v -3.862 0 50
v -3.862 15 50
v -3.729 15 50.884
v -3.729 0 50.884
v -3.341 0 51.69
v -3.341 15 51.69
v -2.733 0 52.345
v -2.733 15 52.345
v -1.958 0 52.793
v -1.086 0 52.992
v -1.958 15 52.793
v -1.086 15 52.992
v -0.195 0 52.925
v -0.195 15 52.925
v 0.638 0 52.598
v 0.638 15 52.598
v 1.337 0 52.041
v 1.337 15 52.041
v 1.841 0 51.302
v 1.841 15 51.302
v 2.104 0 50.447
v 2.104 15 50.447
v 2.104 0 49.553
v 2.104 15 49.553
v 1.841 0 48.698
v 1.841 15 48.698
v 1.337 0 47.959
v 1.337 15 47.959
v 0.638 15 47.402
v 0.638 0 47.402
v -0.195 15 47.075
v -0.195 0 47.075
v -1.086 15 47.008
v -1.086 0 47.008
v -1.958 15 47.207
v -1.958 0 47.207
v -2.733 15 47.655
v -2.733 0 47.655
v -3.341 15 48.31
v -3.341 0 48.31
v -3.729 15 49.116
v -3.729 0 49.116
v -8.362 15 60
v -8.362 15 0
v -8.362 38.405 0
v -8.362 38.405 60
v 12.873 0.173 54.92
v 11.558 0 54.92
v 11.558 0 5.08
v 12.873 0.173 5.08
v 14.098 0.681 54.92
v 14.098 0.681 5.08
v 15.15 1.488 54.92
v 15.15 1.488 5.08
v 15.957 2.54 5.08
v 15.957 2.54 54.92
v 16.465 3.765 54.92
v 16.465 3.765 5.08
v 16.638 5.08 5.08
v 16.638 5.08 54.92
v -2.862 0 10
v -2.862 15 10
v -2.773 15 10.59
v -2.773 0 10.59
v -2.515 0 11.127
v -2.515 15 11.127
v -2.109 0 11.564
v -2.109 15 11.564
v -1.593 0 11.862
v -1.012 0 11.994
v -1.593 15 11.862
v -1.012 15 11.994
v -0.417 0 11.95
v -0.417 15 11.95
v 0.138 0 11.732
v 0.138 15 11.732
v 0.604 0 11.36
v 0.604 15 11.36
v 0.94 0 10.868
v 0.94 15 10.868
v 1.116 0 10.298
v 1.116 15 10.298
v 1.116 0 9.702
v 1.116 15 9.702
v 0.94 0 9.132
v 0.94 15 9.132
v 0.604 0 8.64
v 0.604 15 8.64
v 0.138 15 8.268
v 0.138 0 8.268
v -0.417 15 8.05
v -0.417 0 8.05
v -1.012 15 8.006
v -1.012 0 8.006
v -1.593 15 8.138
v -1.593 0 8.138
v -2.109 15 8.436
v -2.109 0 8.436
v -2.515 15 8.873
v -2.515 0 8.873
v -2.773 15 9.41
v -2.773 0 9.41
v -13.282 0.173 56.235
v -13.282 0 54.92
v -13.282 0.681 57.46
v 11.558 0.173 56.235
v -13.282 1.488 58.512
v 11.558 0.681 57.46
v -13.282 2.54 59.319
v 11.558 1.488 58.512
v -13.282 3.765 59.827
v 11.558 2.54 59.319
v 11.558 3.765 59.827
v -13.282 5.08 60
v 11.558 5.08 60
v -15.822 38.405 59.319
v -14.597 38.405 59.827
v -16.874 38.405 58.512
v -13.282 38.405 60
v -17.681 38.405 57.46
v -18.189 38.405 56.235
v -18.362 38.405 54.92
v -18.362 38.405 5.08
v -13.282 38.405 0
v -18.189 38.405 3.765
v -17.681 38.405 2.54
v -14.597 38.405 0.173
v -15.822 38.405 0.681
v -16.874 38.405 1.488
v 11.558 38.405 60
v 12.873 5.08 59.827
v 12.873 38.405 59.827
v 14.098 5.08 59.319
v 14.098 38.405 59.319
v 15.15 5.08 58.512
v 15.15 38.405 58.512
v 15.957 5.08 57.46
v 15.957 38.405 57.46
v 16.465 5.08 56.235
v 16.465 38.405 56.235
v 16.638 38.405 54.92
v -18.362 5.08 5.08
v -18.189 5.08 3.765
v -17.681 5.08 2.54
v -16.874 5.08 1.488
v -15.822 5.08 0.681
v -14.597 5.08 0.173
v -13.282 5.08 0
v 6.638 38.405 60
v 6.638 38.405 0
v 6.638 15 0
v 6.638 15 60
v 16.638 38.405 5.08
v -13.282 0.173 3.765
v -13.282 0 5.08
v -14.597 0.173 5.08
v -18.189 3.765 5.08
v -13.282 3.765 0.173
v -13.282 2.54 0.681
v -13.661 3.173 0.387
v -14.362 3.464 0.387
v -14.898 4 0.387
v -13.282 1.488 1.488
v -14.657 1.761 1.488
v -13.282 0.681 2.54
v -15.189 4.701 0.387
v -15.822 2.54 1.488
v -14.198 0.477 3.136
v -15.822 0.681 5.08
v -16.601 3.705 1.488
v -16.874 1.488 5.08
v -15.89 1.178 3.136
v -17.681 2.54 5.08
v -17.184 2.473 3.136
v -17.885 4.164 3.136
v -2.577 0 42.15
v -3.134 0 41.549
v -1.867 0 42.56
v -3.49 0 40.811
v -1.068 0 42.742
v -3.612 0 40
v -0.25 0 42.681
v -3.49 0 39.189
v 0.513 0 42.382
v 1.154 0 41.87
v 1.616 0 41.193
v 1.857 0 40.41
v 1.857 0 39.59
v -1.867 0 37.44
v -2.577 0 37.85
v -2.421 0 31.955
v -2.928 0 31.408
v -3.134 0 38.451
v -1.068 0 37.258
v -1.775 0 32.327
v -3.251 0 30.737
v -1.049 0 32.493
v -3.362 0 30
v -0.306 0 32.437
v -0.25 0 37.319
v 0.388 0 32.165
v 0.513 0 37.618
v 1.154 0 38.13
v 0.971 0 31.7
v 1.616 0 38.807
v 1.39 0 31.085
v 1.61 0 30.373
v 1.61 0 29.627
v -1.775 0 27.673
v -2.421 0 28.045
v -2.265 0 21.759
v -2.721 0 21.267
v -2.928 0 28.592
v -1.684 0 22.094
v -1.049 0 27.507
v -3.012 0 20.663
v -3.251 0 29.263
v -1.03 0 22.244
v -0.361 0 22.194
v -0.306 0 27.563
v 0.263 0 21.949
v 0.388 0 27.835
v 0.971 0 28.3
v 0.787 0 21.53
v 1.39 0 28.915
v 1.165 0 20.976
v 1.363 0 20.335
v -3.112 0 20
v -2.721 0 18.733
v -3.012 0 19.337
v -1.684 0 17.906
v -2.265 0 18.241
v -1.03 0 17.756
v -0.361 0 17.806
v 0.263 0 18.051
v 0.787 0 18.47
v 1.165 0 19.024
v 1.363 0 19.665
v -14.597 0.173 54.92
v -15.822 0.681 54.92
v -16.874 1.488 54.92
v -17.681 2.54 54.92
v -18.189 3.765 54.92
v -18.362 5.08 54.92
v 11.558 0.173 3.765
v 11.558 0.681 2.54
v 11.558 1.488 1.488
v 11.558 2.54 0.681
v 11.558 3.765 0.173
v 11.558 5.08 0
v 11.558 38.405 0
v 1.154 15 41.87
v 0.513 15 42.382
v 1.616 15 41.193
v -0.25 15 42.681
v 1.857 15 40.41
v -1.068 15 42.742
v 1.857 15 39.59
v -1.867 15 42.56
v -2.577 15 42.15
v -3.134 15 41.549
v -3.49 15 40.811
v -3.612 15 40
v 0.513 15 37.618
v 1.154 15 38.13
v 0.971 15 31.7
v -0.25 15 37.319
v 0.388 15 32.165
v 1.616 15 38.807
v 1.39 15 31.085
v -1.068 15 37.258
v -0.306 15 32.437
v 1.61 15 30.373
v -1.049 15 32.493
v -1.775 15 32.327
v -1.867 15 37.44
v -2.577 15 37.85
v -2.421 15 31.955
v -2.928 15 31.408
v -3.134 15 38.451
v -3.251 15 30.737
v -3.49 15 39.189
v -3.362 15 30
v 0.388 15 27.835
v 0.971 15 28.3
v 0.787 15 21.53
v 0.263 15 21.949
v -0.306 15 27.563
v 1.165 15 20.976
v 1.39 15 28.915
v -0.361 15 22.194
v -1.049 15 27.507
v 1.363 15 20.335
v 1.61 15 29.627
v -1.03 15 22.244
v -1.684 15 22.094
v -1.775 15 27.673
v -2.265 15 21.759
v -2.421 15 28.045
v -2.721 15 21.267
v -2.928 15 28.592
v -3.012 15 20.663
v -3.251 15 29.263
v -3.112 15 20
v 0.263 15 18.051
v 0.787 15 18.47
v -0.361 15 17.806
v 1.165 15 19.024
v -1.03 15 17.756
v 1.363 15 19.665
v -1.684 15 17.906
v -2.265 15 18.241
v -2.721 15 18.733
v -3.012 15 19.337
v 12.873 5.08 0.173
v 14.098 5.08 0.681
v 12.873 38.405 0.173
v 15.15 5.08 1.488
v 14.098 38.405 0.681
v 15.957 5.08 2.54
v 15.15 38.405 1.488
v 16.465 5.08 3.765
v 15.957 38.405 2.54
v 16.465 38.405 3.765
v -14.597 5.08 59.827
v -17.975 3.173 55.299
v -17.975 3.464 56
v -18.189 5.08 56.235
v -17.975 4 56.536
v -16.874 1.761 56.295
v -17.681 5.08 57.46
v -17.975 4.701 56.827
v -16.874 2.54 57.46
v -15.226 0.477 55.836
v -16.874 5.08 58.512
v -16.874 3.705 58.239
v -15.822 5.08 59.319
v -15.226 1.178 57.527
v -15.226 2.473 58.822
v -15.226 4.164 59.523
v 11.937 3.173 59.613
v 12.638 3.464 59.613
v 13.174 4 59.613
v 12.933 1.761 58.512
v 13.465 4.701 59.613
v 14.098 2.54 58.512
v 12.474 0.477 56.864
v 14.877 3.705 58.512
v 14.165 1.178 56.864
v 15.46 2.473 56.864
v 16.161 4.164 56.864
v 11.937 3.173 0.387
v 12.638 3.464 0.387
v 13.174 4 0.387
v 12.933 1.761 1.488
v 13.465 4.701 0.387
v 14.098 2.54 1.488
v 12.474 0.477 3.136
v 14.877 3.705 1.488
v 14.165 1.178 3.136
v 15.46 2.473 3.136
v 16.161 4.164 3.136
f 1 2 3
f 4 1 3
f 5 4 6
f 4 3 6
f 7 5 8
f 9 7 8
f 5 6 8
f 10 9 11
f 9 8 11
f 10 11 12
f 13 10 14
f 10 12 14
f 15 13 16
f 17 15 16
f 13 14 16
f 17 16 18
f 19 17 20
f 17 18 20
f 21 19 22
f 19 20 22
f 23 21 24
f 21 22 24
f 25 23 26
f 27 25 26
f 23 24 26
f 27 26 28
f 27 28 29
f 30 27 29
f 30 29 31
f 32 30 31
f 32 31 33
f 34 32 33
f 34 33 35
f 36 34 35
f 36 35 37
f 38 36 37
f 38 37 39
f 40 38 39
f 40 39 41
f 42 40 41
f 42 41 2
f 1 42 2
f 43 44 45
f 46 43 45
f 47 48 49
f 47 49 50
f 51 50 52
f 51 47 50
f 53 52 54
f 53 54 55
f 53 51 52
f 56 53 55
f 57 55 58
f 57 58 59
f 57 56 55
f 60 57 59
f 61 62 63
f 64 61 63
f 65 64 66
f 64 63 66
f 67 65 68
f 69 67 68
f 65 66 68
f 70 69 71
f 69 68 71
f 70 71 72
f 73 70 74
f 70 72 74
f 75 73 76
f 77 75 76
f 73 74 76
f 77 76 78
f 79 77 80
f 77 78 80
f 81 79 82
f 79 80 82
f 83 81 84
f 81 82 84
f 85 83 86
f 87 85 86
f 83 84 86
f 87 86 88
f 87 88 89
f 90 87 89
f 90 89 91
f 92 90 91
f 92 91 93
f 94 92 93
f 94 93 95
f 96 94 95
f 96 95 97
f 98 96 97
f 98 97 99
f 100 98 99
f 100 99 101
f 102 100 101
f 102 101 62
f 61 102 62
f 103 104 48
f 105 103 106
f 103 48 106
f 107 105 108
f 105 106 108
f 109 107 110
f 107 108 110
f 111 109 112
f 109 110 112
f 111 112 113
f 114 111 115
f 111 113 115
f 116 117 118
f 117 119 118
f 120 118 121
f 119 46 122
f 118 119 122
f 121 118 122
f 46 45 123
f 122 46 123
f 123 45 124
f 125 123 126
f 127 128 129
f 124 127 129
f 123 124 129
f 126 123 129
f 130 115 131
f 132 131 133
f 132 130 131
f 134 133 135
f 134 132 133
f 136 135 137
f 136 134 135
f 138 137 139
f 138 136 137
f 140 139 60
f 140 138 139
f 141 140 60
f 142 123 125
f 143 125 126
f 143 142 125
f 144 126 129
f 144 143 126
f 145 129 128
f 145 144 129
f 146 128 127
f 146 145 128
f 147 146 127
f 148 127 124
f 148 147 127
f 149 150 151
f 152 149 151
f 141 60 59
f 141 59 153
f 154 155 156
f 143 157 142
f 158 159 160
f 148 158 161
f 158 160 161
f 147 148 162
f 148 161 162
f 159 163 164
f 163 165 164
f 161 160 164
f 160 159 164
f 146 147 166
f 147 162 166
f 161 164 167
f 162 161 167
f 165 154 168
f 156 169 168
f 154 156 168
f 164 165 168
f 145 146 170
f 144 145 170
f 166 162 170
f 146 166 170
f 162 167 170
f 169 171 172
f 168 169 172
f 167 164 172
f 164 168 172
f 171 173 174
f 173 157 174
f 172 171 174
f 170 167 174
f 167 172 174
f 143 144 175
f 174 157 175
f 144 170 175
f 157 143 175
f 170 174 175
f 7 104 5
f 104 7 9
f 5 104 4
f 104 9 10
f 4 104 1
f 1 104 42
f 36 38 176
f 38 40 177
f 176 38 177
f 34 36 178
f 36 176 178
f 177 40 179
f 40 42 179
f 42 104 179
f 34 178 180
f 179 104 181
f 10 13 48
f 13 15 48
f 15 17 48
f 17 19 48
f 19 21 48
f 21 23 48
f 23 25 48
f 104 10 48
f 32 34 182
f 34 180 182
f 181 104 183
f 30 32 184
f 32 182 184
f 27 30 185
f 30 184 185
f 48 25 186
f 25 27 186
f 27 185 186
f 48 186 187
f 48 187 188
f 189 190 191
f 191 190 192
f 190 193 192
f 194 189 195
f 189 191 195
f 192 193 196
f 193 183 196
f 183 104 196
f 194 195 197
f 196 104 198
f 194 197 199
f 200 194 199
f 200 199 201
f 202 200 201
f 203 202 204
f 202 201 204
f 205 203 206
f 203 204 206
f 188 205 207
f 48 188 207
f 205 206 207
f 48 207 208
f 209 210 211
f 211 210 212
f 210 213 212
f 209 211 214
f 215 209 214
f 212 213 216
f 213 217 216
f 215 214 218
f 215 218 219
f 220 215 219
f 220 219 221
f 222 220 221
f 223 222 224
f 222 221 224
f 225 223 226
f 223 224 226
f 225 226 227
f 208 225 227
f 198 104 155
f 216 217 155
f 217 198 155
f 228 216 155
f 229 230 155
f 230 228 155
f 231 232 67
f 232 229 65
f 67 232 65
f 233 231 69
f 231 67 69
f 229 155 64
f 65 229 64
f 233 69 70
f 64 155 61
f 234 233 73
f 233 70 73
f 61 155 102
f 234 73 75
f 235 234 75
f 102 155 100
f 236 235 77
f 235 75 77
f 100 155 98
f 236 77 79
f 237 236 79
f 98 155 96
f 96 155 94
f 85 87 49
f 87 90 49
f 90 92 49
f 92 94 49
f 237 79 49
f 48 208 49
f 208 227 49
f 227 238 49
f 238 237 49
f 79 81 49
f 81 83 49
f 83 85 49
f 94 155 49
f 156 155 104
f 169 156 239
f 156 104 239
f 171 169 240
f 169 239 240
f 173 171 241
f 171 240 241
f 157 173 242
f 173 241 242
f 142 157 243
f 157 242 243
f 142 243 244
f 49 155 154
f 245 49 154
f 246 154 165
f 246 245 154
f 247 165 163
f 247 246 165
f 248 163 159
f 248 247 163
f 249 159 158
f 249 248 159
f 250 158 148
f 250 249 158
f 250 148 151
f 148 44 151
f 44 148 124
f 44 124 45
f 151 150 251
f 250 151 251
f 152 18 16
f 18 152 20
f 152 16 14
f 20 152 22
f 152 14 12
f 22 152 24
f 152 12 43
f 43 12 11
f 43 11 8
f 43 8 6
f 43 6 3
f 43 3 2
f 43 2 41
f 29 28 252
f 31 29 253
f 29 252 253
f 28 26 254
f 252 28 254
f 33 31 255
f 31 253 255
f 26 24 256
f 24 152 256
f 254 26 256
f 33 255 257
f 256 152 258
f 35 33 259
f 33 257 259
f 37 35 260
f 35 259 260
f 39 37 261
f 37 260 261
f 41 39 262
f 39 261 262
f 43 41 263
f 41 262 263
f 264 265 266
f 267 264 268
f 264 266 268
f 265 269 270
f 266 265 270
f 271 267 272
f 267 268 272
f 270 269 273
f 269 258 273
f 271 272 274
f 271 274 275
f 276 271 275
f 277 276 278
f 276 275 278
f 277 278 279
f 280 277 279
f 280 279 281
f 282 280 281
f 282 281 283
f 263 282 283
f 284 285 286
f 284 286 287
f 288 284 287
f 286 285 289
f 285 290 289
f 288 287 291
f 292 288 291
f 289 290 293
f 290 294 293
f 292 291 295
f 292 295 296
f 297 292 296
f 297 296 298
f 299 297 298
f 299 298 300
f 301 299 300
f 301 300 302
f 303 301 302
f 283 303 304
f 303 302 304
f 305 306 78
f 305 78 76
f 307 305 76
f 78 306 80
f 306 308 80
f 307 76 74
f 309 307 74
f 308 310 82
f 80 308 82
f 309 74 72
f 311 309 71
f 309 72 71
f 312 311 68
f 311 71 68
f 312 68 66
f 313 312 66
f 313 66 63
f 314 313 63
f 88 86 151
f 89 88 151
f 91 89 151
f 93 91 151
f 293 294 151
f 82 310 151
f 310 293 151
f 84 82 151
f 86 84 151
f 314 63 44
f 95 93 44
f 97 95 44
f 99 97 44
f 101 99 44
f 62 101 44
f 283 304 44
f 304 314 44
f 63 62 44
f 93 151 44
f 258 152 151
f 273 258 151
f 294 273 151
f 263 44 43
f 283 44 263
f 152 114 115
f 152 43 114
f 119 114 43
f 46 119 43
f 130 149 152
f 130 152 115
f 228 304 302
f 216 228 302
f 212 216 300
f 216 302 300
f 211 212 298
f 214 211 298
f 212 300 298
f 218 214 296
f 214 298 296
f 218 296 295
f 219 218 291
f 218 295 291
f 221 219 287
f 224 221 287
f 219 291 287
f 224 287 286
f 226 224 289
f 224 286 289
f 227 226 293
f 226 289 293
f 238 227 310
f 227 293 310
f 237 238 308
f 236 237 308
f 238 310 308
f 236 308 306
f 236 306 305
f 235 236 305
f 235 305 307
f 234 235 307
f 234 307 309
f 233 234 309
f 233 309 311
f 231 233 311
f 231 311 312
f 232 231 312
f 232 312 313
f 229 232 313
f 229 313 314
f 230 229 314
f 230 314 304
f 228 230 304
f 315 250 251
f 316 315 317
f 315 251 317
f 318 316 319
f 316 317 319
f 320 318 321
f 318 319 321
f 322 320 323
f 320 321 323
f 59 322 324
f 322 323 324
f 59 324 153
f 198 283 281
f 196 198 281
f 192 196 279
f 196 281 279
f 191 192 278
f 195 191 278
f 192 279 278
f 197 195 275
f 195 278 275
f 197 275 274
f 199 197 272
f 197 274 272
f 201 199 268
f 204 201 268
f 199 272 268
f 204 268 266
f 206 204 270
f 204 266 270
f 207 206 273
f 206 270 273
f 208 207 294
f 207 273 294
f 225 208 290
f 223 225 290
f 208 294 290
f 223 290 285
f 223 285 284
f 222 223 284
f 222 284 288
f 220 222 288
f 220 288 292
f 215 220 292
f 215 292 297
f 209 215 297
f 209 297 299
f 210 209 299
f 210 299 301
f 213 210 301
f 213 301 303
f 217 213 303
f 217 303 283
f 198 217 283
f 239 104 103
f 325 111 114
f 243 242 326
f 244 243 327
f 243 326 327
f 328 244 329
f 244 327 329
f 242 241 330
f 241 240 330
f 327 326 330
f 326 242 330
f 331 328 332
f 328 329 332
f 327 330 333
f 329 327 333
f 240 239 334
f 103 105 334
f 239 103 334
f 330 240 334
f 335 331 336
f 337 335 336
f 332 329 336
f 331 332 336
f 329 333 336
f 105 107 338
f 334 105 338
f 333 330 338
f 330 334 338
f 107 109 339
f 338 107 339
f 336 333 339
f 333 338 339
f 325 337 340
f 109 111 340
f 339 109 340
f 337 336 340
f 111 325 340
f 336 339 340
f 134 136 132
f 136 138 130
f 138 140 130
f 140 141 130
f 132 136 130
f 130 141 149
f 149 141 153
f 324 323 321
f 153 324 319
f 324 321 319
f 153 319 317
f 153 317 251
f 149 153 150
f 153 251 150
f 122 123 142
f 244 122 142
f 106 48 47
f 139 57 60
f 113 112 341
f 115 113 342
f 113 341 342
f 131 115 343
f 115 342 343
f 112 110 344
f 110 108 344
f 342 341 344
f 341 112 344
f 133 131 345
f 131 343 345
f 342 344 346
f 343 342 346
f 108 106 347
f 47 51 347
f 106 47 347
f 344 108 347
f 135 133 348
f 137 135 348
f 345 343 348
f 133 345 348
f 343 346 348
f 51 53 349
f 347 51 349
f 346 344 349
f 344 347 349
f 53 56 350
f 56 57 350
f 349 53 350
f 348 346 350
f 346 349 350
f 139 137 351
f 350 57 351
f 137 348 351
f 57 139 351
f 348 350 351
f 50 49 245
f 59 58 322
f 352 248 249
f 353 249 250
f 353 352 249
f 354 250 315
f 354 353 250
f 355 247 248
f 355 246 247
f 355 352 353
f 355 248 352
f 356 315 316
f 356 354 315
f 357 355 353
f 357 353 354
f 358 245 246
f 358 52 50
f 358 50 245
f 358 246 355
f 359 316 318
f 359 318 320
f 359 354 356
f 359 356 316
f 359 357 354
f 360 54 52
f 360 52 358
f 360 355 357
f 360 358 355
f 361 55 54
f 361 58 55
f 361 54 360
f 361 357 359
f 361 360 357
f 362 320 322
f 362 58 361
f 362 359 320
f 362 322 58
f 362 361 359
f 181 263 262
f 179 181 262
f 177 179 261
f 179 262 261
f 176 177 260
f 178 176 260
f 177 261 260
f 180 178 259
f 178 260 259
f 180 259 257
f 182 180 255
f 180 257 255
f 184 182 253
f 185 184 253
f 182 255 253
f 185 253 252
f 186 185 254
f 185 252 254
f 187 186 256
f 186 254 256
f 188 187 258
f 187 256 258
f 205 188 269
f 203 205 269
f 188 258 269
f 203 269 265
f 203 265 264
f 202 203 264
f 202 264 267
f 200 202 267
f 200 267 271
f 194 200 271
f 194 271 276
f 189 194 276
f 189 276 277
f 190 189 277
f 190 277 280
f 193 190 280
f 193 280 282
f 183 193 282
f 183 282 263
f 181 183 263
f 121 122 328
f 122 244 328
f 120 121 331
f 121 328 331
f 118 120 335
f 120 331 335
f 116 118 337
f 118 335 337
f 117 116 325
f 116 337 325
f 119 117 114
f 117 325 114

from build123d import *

# Parameters (mm, degrees)
F1_DEPTH = 60
F3_D     = 4
F4_D     = 4.5
F5_D     = 5
F6_D     = 5.5
F7_D     = 6
F8_R     = 5.08


with BuildPart() as f1:
    # F0 (on Top) → F1 (new body)
    with BuildSketch(Plane.XY):
        Polygon((-18.362068, 0), (-17.327586, 0), (16.637932, 0), (16.637932, 38.40517), (6.637932, 38.40517), (6.637932, 15), (-8.362068, 15), (-8.362068, 38.40517), (-18.362068, 38.40517), align=None)
    extrude(amount=F1_DEPTH)

    # F3 (through all)
    with Locations(Plane.XZ):
        with Locations((-0.862068, 10)):
            Hole(F3_D / 2)

    # F4 (through all)
    with Locations(Plane.XZ):
        with Locations((-0.862068, 20)):
            Hole(F4_D / 2)

    # F5 (through all)
    with Locations(Plane.XZ):
        with Locations((-0.862068, 30)):
            Hole(F5_D / 2)

    # F6 (through all)
    with Locations(Plane.XZ):
        with Locations((-0.862068, 40)):
            Hole(F6_D / 2)

    # F7 (through all)
    with Locations(Plane.XZ):
        with Locations((-0.862068, 50)):
            Hole(F7_D / 2)

    # F8
    f8_edges = [f1.edges().sort_by_distance(p)[0] for p in [
        (16.637932, 0, 30),
        (-0.862068, 0, 60),
        (-18.362068, 0, 30),
        (-0.862068, 0, 0),
        (-18.362068, 19.202585, 60),
        (16.637932, 19.202585, 60),
        (-18.362068, 19.202585, 0),
        (16.637932, 19.202585, 0),
    ]]
    fillet(f8_edges, radius=F8_R)


solid = f1.part
